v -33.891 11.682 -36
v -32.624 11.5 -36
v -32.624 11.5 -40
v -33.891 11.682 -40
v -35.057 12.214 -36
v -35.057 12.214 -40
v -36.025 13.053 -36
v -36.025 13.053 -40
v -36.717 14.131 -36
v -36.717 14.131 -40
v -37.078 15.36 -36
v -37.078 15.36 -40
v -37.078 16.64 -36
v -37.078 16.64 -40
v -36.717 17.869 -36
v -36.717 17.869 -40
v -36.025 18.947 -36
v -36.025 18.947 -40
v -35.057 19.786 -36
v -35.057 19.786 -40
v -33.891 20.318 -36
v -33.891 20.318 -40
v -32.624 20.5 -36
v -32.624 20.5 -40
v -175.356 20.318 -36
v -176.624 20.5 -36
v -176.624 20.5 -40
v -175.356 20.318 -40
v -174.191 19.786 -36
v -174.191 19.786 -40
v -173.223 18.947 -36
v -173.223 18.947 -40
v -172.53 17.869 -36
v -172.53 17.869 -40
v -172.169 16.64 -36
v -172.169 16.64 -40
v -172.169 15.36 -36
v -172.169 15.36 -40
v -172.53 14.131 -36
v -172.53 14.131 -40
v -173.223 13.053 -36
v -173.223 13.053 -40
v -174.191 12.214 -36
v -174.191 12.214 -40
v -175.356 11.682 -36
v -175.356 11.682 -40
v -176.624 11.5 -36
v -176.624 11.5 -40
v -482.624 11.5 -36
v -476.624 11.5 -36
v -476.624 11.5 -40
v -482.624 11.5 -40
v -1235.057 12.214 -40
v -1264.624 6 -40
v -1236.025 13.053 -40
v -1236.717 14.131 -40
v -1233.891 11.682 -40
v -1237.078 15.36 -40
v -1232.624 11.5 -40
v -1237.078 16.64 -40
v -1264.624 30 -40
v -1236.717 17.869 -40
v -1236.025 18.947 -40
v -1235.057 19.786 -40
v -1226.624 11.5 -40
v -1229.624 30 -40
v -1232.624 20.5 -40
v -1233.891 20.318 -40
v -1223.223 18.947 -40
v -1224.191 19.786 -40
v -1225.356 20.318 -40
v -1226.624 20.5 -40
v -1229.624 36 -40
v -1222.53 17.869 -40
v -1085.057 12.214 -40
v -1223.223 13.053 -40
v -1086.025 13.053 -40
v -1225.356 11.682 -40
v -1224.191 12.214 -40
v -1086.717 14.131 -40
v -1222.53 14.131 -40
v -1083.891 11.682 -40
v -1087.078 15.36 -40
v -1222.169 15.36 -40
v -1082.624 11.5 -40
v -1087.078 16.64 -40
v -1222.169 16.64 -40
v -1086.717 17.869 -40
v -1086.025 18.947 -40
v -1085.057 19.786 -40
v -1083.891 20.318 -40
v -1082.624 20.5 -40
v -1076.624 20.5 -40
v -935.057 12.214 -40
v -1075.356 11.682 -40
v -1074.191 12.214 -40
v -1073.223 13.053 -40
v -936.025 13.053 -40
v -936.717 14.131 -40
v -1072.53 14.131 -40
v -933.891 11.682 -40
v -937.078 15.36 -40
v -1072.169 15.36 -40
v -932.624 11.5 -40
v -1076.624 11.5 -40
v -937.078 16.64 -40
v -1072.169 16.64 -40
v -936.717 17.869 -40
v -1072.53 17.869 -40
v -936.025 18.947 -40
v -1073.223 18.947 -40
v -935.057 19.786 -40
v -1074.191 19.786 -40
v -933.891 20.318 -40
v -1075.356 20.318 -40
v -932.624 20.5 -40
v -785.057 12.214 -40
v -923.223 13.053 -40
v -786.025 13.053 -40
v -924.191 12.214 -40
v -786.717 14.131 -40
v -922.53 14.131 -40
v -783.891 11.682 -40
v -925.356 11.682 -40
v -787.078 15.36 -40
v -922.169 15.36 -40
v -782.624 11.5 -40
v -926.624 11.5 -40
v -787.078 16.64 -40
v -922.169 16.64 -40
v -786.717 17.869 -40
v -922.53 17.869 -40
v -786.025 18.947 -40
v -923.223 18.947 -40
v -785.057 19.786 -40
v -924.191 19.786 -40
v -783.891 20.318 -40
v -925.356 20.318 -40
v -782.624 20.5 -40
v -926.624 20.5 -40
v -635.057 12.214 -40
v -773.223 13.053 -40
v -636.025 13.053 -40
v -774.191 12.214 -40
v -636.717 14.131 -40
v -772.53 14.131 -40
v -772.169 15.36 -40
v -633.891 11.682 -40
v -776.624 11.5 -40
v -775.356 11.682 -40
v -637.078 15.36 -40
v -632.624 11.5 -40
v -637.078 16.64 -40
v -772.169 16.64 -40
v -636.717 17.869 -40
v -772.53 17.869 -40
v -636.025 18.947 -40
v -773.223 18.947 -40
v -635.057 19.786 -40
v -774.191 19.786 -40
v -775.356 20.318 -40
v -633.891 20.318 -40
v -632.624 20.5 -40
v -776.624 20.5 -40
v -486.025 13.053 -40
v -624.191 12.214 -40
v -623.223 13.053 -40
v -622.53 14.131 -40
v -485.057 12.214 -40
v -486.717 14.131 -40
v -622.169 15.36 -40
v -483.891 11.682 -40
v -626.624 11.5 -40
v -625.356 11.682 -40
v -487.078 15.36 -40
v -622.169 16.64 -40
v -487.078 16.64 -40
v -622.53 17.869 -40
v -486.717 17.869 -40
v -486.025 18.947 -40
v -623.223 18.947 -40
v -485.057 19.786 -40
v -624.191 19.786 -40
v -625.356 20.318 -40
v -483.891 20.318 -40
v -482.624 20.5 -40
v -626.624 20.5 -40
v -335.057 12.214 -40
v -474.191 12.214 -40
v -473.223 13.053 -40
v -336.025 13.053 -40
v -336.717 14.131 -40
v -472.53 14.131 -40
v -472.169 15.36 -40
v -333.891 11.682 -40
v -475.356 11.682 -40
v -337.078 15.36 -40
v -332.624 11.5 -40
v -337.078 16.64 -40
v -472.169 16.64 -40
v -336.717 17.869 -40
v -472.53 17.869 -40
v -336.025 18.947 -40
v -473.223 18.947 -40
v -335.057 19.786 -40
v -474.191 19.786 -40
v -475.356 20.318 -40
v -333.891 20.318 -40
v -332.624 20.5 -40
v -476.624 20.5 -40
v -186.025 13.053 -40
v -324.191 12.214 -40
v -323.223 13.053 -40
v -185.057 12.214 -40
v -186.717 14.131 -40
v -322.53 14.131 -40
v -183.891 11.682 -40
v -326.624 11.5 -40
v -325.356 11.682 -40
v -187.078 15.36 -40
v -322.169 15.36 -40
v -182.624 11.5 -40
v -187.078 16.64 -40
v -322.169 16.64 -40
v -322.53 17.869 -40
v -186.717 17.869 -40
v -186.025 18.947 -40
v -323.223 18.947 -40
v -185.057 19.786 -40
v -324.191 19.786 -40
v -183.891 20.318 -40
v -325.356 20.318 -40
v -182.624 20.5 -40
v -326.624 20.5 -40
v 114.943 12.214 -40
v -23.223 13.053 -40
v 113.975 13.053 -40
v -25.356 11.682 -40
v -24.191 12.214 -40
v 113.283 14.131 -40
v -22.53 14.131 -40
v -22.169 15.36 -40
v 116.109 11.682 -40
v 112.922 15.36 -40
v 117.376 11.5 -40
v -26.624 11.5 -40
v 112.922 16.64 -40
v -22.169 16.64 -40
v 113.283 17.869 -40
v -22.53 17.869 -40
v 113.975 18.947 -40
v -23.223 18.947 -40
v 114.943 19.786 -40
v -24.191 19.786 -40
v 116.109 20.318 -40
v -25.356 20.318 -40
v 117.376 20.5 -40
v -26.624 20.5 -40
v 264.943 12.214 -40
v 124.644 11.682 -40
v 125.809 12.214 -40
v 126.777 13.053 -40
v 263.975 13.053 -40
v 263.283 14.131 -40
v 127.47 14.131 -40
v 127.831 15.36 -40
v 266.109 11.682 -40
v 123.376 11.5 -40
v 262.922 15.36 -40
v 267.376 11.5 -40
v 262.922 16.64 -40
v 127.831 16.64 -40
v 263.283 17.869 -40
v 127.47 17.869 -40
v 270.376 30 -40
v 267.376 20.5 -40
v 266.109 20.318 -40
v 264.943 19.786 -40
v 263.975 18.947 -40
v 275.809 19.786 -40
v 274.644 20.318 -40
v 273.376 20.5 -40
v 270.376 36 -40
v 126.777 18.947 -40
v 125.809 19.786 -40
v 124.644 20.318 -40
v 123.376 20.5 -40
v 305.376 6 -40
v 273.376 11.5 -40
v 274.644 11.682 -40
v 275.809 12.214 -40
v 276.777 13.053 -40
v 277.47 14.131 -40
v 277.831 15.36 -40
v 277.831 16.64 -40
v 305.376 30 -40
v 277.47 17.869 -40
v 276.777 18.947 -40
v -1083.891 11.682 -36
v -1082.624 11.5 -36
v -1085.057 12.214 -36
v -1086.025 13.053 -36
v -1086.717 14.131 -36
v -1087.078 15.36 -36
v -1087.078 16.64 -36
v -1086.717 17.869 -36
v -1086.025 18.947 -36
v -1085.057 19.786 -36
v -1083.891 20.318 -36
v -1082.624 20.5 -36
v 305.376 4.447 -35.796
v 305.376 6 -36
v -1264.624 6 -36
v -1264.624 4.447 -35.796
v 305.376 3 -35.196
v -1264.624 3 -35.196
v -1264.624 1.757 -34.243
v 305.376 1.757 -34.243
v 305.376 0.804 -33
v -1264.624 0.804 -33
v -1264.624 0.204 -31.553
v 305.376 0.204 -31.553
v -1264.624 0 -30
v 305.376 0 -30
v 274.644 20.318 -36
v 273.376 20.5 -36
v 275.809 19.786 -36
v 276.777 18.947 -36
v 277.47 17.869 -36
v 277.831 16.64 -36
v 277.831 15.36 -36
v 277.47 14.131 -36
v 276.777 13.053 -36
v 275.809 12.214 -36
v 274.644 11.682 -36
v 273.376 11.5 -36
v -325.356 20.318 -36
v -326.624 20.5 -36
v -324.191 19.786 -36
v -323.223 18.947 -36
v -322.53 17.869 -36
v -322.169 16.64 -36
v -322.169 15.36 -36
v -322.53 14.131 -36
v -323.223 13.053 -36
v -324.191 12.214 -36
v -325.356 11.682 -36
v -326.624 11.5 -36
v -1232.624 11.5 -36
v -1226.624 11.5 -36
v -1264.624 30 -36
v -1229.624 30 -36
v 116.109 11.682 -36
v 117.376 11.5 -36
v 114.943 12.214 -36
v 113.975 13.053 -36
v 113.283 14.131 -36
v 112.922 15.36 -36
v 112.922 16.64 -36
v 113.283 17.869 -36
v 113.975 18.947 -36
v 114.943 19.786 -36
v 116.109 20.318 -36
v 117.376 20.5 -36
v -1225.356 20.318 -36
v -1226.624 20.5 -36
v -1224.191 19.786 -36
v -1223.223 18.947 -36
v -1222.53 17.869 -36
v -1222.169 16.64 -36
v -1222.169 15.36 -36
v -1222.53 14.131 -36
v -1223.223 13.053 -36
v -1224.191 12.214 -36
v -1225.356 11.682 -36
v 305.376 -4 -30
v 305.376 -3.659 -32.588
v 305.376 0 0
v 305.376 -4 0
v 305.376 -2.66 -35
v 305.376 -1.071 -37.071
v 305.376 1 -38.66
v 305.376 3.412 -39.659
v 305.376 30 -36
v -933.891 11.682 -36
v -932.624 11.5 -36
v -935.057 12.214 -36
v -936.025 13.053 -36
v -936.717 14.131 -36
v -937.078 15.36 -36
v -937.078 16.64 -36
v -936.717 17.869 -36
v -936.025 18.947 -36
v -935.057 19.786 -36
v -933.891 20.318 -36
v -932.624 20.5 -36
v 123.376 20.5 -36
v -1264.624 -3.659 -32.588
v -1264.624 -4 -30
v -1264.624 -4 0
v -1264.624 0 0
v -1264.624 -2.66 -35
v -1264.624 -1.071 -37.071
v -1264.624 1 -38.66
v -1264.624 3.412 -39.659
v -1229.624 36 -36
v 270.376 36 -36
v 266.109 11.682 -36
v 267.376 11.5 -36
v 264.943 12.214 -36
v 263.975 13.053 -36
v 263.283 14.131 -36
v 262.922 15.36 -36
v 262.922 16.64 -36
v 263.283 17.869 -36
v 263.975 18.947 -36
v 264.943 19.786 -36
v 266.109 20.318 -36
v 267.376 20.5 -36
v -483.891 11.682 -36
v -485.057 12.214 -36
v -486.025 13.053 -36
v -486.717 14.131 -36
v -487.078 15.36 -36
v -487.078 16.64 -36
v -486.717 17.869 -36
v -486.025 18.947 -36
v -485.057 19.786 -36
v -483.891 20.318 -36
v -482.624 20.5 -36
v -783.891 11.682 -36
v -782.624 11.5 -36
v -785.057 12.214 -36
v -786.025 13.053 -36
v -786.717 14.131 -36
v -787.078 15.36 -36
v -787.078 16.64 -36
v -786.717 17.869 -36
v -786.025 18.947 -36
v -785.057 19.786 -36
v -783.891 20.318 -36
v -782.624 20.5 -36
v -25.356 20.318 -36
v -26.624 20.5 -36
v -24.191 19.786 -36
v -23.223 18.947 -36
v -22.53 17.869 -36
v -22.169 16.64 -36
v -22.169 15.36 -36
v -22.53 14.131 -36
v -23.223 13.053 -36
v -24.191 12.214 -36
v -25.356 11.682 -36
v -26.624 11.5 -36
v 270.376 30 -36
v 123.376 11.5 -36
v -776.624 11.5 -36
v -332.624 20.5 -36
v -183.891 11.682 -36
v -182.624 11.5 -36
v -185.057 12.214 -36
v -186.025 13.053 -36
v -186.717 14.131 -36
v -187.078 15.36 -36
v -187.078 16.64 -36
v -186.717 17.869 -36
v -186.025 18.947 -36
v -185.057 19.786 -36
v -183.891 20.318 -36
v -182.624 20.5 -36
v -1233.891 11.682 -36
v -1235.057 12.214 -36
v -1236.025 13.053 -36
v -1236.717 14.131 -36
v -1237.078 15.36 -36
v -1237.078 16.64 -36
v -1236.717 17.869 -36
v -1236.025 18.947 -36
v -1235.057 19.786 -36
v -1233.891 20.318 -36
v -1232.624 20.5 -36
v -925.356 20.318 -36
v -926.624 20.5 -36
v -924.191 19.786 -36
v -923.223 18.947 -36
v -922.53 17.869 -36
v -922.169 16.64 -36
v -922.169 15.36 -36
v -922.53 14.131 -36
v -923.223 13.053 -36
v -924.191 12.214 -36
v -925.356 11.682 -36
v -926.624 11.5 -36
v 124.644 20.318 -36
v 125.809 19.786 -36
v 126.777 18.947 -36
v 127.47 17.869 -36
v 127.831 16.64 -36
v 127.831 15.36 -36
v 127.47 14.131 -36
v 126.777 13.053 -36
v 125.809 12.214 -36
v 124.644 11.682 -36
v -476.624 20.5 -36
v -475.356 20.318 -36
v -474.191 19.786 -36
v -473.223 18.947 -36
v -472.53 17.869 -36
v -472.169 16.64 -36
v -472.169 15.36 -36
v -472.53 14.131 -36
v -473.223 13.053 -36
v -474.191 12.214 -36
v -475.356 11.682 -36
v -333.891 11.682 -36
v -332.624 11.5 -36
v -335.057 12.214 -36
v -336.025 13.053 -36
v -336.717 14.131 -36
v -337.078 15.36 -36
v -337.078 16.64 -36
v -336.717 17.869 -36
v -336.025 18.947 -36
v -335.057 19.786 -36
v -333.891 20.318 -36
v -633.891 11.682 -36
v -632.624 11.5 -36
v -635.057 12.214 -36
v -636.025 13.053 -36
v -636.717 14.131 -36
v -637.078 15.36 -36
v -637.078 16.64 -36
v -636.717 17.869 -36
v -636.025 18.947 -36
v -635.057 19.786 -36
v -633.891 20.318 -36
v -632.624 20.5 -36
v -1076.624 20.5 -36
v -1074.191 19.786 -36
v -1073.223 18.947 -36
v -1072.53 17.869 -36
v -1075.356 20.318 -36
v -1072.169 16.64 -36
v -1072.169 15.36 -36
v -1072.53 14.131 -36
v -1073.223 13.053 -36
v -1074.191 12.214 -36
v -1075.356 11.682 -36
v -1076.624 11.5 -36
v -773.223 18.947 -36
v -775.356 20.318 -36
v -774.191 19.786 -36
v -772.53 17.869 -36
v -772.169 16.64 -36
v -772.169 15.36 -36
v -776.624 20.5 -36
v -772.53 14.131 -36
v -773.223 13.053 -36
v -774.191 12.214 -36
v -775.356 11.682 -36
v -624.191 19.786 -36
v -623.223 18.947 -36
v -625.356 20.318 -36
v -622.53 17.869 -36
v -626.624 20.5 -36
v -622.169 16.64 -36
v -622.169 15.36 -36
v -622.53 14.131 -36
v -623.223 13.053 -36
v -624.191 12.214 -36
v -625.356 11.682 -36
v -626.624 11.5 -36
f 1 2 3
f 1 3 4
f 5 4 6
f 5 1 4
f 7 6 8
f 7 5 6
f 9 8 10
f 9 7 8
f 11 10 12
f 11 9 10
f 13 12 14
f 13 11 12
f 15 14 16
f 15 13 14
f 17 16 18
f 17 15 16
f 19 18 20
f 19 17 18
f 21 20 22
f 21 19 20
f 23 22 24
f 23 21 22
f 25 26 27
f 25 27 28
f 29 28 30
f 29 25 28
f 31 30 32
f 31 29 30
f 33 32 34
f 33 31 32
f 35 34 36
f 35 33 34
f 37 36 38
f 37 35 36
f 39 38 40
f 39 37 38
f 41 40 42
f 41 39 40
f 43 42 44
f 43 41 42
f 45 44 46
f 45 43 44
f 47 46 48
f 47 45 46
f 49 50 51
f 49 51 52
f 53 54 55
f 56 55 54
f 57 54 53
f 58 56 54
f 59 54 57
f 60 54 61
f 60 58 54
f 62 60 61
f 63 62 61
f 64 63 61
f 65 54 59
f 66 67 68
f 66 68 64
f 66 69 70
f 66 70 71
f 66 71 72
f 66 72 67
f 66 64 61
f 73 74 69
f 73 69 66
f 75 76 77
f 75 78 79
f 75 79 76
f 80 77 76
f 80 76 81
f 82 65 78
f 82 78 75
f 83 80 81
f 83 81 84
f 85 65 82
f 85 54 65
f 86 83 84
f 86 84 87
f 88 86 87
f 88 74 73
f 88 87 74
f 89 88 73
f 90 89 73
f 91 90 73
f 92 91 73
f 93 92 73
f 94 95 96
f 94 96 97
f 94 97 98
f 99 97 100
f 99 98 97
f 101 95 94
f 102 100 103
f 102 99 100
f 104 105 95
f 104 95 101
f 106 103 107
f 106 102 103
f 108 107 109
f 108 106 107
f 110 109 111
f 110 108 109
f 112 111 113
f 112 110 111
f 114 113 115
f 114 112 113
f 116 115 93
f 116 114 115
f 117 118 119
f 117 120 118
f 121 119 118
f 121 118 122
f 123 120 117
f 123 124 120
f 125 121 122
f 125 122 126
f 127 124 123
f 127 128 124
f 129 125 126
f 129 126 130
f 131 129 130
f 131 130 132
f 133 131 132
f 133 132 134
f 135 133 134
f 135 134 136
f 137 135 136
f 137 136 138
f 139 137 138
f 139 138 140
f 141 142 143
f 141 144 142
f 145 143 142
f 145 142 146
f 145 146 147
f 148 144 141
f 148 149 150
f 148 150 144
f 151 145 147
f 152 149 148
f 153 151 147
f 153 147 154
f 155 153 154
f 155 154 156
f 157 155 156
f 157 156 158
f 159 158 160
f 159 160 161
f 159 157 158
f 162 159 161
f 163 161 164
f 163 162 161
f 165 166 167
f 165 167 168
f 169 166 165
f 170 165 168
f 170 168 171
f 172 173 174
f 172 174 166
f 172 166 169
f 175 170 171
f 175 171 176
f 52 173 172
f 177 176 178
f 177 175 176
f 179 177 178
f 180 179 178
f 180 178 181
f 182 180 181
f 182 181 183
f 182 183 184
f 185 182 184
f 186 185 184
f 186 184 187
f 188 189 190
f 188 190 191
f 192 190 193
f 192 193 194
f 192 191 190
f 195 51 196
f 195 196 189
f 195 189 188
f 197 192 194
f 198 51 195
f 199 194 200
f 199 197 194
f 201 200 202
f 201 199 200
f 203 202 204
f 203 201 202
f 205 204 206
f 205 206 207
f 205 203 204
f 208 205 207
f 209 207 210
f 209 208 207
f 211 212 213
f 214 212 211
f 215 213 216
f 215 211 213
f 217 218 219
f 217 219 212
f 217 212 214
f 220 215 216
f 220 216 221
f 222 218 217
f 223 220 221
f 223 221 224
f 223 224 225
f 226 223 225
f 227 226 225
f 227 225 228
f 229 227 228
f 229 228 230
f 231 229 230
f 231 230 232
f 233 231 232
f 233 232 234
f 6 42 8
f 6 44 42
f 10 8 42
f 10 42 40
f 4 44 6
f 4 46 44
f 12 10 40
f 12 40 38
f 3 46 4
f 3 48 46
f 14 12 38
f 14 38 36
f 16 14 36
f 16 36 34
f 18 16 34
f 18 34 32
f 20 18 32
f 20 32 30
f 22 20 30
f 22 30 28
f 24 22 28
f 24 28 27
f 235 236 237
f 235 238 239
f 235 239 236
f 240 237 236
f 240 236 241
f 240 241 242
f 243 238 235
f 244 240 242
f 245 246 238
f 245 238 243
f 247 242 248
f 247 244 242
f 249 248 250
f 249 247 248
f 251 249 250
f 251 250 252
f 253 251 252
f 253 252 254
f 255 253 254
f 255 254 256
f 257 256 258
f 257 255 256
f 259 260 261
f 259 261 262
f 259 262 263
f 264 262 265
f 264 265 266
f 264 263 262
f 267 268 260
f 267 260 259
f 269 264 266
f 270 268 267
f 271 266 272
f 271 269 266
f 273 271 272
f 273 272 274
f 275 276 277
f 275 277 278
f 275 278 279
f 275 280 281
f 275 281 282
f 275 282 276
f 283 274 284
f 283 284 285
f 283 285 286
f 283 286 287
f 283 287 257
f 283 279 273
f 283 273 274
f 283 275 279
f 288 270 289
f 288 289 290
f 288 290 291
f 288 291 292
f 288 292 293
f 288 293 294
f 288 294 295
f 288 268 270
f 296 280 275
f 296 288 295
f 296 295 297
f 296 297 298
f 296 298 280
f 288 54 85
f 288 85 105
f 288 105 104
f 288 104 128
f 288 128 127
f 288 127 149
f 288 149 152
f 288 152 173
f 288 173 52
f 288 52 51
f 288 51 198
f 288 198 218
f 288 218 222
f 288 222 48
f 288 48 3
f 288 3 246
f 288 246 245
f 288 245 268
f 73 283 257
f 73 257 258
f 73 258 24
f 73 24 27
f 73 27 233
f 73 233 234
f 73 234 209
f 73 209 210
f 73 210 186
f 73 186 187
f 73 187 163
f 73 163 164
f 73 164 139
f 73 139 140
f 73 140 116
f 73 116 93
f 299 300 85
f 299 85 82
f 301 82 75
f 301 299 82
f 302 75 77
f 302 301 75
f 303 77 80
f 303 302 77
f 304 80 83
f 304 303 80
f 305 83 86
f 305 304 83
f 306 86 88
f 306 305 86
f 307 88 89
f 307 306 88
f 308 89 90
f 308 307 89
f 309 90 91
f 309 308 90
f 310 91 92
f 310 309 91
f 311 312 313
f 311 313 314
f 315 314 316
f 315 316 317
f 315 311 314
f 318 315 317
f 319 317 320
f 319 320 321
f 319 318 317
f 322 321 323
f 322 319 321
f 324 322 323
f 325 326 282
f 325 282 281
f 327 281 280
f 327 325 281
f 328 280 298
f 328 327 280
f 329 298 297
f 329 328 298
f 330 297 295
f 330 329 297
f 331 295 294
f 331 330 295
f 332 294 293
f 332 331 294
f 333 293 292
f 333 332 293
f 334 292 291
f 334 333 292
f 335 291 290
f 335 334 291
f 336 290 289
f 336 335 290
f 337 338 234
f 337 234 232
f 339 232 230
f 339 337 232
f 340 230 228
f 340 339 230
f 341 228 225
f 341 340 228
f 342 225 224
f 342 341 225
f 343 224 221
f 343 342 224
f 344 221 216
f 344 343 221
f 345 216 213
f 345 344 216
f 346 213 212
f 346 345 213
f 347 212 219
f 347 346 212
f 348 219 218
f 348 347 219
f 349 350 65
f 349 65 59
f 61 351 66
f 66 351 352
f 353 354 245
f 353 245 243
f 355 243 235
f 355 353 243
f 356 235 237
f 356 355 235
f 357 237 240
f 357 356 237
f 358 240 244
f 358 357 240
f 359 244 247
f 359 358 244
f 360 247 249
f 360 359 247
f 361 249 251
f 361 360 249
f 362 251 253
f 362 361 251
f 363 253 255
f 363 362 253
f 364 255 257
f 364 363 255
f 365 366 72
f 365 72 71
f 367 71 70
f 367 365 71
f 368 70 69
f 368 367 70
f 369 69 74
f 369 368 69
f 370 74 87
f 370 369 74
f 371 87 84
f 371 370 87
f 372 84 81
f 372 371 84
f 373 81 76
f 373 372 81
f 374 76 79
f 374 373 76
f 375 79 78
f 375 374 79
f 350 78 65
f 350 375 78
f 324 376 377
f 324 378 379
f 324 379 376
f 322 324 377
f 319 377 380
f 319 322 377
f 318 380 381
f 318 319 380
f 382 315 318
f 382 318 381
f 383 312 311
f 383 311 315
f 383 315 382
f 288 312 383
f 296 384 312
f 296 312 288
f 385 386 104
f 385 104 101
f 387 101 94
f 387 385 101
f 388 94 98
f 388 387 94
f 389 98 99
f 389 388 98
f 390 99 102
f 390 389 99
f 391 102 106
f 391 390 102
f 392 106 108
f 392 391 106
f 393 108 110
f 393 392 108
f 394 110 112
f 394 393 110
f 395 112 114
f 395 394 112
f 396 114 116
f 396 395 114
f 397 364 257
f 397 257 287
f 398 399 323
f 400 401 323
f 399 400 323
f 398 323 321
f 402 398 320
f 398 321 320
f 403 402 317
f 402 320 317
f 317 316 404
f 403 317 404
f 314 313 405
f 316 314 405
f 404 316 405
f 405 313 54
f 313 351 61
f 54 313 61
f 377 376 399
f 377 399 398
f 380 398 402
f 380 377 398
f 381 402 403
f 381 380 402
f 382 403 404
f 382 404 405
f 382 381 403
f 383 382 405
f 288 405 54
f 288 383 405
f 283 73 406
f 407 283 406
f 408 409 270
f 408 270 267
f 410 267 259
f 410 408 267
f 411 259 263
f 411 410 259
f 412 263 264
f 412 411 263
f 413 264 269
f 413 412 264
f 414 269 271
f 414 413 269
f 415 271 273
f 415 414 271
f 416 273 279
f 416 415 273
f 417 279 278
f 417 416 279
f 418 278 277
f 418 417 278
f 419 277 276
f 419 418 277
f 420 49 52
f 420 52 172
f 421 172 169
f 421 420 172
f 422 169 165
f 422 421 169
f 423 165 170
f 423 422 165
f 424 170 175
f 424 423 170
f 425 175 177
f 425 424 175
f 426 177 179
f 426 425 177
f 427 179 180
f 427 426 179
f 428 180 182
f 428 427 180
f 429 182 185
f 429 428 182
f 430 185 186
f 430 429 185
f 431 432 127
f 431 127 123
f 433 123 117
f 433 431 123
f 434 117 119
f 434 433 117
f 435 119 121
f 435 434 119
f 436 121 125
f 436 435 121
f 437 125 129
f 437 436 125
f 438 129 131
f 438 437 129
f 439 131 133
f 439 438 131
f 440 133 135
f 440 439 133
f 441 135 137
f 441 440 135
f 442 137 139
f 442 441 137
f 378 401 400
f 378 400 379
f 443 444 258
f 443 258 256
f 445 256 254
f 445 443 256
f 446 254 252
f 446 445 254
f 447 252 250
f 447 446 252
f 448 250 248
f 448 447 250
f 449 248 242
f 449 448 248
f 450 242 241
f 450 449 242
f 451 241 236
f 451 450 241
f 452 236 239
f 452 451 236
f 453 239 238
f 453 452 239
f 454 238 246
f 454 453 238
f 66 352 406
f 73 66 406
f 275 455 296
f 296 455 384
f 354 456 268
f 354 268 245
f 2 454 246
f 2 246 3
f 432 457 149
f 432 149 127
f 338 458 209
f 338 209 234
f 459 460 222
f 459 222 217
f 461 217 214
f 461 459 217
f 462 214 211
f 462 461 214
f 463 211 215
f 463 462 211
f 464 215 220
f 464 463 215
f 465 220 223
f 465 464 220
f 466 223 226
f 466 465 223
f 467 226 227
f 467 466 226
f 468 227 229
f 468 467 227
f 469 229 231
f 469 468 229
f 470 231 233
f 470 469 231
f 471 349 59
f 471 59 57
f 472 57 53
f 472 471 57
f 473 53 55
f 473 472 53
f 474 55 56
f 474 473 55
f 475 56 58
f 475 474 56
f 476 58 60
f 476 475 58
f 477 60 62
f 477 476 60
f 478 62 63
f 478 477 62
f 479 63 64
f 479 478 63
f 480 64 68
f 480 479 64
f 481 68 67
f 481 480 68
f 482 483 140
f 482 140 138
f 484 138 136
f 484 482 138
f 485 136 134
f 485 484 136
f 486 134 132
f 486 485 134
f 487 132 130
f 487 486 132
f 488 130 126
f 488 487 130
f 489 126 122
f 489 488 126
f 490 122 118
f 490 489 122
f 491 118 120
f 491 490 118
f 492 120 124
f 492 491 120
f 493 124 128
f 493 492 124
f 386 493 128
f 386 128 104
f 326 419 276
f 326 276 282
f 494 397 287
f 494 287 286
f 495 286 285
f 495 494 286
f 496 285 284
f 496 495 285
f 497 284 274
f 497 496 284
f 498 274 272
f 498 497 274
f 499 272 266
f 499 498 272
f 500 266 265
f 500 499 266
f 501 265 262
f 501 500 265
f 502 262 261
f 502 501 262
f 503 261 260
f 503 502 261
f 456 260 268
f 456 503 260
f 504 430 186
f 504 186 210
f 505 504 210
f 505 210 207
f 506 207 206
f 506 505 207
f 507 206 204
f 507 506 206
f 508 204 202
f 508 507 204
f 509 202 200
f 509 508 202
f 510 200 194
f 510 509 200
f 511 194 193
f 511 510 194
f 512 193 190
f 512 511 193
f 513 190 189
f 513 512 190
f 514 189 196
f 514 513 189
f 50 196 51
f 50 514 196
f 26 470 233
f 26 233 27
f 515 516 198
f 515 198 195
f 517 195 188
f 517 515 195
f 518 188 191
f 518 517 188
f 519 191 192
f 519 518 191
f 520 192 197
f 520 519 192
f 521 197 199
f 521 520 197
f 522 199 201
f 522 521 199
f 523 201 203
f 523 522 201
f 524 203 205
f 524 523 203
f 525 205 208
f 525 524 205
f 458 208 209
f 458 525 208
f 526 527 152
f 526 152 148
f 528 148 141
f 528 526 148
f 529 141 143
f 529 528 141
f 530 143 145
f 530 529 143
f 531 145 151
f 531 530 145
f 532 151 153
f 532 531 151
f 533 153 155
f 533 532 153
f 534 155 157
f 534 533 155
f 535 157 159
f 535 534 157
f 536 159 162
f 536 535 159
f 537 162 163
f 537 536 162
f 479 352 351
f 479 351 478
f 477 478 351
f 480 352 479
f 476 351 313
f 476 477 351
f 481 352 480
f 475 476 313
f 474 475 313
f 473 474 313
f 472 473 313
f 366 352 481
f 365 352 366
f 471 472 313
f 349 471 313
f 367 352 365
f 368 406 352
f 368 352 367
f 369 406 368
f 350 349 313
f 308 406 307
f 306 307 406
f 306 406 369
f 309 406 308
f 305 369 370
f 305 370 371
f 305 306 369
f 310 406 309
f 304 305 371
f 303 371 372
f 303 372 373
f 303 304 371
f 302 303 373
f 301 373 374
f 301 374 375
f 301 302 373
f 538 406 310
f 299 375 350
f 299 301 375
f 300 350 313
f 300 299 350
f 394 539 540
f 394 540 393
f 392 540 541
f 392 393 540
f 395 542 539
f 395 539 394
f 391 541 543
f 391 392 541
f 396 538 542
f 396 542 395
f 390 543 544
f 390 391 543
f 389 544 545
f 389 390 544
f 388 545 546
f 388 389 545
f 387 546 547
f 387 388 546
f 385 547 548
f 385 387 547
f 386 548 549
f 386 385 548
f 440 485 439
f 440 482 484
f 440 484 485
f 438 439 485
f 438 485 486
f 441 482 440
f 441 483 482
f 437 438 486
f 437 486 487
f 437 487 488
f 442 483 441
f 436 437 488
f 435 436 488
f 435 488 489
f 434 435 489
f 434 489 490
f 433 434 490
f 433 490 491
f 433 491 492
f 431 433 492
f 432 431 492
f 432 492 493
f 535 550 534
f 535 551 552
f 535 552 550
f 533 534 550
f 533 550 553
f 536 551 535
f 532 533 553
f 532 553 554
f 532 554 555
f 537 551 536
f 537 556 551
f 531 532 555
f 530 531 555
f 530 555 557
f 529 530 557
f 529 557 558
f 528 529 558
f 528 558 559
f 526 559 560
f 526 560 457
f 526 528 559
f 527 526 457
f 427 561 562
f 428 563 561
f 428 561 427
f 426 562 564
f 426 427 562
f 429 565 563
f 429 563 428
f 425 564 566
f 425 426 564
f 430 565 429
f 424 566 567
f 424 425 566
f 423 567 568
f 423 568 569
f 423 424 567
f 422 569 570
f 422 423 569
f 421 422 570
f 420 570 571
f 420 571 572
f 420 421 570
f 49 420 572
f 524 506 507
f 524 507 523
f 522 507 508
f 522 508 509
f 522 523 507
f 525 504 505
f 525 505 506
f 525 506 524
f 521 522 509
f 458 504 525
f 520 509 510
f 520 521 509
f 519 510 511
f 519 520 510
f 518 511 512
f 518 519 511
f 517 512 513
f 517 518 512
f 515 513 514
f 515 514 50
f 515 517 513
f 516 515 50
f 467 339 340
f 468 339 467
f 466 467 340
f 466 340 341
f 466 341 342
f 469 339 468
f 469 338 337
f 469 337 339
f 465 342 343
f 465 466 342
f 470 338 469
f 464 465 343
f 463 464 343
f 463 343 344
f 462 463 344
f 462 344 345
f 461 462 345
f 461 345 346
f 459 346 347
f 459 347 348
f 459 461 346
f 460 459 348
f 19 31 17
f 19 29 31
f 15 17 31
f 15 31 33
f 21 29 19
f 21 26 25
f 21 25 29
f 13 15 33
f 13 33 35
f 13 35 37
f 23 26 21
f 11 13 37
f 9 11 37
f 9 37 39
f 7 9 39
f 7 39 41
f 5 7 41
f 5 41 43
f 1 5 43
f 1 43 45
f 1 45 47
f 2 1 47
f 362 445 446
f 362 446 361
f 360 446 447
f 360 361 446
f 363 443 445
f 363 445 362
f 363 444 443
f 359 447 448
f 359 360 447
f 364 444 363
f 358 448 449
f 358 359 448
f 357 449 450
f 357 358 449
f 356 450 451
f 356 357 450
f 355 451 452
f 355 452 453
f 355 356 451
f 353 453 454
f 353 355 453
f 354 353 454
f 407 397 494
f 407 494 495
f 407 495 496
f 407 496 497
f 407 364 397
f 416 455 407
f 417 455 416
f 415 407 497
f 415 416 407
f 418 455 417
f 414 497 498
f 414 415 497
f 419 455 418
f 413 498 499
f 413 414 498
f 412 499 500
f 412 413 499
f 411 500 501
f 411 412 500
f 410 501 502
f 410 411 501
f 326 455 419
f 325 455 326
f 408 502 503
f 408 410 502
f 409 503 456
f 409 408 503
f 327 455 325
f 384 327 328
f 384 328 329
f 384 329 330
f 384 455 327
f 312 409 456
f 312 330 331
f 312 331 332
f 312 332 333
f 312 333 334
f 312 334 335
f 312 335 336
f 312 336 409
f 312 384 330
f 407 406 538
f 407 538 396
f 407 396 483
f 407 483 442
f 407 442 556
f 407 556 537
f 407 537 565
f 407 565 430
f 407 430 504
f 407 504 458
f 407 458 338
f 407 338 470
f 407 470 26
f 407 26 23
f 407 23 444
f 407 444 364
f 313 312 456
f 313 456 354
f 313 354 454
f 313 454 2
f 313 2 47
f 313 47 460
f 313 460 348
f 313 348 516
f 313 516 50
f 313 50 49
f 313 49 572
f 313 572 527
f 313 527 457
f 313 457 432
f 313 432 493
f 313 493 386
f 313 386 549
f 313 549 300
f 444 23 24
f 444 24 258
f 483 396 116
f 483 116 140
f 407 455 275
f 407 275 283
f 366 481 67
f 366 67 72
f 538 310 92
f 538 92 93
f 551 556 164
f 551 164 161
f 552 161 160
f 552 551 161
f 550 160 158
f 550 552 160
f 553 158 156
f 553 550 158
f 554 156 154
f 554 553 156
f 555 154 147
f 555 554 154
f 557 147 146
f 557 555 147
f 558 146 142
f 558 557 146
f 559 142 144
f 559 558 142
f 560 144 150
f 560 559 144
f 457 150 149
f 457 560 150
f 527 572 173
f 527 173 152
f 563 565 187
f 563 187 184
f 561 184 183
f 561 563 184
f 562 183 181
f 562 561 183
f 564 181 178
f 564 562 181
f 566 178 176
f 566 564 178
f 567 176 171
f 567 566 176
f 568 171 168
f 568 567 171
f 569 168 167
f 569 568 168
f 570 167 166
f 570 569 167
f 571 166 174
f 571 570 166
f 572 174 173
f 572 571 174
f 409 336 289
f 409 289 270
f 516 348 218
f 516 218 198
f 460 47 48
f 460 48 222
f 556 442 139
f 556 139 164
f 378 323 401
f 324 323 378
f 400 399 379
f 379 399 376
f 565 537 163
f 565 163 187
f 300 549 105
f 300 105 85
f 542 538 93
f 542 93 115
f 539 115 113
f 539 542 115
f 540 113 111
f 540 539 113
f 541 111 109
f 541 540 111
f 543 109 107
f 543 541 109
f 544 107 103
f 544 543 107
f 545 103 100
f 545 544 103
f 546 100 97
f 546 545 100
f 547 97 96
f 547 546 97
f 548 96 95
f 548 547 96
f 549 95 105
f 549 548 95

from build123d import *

# Parameters (mm, degrees)
SKETCH1_W                    = 1570
SKETCH1_H                    = 40
BASE_FLANGE1_DEPTH           = 4
EDGE_FLANGE1_STRIP_W         = 28
EDGE_FLANGE1_STRIP_H         = 4
EDGE_FLANGE1_STRIP_CUT_DEPTH = 1570
EDGE_FLANGE1_DEPTH           = 1570
SKETCH9_W                    = 35
SKETCH9_H                    = 6
CUT_EXTRUDE1_DEPTH           = 10
CUT_EXTRUDE2_DEPTH           = 10
LPATTERN1_COUNT              = 11
LPATTERN1_PITCH              = 150


# Sheet-metal steps are written as plain solids
with BuildPart() as part:
    # Sketch1 → Base-Flange1 (new body)
    with BuildSketch(Plane(origin=(0, 0, 0), x_dir=(1, 0, 0), z_dir=(0, 1, 0))):
        with Locations((-479.623655914, 20)):
            Rectangle(SKETCH1_W, SKETCH1_H)
    extrude(amount=-BASE_FLANGE1_DEPTH)

    # Edge-Flange1 strip (across the edge) → Edge-Flange1 strip cut (cut)
    with BuildSketch(Plane(origin=(305.376344086, 0, -40), x_dir=(0, 0, 1), z_dir=(-1, 0, 0))):
        with Locations((-4, -2)):
            Rectangle(EDGE_FLANGE1_STRIP_W, EDGE_FLANGE1_STRIP_H)
    extrude(amount=EDGE_FLANGE1_STRIP_CUT_DEPTH, mode=Mode.SUBTRACT)

    # Edge-Flange1 section (across the edge) → Edge-Flange1 (add)
    with BuildSketch(Plane(origin=(305.376344086, 0, -40), x_dir=(0, 0, 1), z_dir=(-1, 0, 0))):
        with BuildLine():
            Line((0, 6), (0, 36))
            Line((0, 36), (4, 36))
            Line((4, 36), (4, 6))
            ThreePointArc((4, 6), (5.757359313, 1.757359313), (10, 0))
            Line((10, 0), (10, -4))
            ThreePointArc((10, -4), (2.928932188, -1.071067812), (0, 6))
        make_face()
    extrude(amount=EDGE_FLANGE1_DEPTH)

    # Sketch9 → Cut-Extrude1 (cut)
    with BuildSketch(Plane.XY.offset(-36)):
        with Locations((287.876344086, 33)):
            Rectangle(SKETCH9_W, SKETCH9_H)
        with Locations((-1247.123655914, 33)):
            Rectangle(SKETCH9_W, SKETCH9_H)
    extrude(amount=-CUT_EXTRUDE1_DEPTH, mode=Mode.SUBTRACT)

    # Sketch10 → Cut-Extrude2 (cut)
    with BuildSketch(Plane.XY.offset(-36)):
        with BuildLine():
            Line((273.376344086, 11.5), (267.376344086, 11.5))
            ThreePointArc((267.376344086, 11.5), (262.876344086, 16), (267.376344086, 20.5))
            Line((267.376344086, 20.5), (273.376344086, 20.5))
            ThreePointArc((273.376344086, 20.5), (277.876344086, 16), (273.376344086, 11.5))
        make_face()
    cut_extrude2 = extrude(amount=-CUT_EXTRUDE2_DEPTH, mode=Mode.SUBTRACT)

    # LPattern1: Cut-Extrude2 ×11
    with Locations(*[(-i * LPATTERN1_PITCH, 0, 0) for i in range(1, LPATTERN1_COUNT)]):
        add(cut_extrude2, mode=Mode.SUBTRACT)


solid = part.part
